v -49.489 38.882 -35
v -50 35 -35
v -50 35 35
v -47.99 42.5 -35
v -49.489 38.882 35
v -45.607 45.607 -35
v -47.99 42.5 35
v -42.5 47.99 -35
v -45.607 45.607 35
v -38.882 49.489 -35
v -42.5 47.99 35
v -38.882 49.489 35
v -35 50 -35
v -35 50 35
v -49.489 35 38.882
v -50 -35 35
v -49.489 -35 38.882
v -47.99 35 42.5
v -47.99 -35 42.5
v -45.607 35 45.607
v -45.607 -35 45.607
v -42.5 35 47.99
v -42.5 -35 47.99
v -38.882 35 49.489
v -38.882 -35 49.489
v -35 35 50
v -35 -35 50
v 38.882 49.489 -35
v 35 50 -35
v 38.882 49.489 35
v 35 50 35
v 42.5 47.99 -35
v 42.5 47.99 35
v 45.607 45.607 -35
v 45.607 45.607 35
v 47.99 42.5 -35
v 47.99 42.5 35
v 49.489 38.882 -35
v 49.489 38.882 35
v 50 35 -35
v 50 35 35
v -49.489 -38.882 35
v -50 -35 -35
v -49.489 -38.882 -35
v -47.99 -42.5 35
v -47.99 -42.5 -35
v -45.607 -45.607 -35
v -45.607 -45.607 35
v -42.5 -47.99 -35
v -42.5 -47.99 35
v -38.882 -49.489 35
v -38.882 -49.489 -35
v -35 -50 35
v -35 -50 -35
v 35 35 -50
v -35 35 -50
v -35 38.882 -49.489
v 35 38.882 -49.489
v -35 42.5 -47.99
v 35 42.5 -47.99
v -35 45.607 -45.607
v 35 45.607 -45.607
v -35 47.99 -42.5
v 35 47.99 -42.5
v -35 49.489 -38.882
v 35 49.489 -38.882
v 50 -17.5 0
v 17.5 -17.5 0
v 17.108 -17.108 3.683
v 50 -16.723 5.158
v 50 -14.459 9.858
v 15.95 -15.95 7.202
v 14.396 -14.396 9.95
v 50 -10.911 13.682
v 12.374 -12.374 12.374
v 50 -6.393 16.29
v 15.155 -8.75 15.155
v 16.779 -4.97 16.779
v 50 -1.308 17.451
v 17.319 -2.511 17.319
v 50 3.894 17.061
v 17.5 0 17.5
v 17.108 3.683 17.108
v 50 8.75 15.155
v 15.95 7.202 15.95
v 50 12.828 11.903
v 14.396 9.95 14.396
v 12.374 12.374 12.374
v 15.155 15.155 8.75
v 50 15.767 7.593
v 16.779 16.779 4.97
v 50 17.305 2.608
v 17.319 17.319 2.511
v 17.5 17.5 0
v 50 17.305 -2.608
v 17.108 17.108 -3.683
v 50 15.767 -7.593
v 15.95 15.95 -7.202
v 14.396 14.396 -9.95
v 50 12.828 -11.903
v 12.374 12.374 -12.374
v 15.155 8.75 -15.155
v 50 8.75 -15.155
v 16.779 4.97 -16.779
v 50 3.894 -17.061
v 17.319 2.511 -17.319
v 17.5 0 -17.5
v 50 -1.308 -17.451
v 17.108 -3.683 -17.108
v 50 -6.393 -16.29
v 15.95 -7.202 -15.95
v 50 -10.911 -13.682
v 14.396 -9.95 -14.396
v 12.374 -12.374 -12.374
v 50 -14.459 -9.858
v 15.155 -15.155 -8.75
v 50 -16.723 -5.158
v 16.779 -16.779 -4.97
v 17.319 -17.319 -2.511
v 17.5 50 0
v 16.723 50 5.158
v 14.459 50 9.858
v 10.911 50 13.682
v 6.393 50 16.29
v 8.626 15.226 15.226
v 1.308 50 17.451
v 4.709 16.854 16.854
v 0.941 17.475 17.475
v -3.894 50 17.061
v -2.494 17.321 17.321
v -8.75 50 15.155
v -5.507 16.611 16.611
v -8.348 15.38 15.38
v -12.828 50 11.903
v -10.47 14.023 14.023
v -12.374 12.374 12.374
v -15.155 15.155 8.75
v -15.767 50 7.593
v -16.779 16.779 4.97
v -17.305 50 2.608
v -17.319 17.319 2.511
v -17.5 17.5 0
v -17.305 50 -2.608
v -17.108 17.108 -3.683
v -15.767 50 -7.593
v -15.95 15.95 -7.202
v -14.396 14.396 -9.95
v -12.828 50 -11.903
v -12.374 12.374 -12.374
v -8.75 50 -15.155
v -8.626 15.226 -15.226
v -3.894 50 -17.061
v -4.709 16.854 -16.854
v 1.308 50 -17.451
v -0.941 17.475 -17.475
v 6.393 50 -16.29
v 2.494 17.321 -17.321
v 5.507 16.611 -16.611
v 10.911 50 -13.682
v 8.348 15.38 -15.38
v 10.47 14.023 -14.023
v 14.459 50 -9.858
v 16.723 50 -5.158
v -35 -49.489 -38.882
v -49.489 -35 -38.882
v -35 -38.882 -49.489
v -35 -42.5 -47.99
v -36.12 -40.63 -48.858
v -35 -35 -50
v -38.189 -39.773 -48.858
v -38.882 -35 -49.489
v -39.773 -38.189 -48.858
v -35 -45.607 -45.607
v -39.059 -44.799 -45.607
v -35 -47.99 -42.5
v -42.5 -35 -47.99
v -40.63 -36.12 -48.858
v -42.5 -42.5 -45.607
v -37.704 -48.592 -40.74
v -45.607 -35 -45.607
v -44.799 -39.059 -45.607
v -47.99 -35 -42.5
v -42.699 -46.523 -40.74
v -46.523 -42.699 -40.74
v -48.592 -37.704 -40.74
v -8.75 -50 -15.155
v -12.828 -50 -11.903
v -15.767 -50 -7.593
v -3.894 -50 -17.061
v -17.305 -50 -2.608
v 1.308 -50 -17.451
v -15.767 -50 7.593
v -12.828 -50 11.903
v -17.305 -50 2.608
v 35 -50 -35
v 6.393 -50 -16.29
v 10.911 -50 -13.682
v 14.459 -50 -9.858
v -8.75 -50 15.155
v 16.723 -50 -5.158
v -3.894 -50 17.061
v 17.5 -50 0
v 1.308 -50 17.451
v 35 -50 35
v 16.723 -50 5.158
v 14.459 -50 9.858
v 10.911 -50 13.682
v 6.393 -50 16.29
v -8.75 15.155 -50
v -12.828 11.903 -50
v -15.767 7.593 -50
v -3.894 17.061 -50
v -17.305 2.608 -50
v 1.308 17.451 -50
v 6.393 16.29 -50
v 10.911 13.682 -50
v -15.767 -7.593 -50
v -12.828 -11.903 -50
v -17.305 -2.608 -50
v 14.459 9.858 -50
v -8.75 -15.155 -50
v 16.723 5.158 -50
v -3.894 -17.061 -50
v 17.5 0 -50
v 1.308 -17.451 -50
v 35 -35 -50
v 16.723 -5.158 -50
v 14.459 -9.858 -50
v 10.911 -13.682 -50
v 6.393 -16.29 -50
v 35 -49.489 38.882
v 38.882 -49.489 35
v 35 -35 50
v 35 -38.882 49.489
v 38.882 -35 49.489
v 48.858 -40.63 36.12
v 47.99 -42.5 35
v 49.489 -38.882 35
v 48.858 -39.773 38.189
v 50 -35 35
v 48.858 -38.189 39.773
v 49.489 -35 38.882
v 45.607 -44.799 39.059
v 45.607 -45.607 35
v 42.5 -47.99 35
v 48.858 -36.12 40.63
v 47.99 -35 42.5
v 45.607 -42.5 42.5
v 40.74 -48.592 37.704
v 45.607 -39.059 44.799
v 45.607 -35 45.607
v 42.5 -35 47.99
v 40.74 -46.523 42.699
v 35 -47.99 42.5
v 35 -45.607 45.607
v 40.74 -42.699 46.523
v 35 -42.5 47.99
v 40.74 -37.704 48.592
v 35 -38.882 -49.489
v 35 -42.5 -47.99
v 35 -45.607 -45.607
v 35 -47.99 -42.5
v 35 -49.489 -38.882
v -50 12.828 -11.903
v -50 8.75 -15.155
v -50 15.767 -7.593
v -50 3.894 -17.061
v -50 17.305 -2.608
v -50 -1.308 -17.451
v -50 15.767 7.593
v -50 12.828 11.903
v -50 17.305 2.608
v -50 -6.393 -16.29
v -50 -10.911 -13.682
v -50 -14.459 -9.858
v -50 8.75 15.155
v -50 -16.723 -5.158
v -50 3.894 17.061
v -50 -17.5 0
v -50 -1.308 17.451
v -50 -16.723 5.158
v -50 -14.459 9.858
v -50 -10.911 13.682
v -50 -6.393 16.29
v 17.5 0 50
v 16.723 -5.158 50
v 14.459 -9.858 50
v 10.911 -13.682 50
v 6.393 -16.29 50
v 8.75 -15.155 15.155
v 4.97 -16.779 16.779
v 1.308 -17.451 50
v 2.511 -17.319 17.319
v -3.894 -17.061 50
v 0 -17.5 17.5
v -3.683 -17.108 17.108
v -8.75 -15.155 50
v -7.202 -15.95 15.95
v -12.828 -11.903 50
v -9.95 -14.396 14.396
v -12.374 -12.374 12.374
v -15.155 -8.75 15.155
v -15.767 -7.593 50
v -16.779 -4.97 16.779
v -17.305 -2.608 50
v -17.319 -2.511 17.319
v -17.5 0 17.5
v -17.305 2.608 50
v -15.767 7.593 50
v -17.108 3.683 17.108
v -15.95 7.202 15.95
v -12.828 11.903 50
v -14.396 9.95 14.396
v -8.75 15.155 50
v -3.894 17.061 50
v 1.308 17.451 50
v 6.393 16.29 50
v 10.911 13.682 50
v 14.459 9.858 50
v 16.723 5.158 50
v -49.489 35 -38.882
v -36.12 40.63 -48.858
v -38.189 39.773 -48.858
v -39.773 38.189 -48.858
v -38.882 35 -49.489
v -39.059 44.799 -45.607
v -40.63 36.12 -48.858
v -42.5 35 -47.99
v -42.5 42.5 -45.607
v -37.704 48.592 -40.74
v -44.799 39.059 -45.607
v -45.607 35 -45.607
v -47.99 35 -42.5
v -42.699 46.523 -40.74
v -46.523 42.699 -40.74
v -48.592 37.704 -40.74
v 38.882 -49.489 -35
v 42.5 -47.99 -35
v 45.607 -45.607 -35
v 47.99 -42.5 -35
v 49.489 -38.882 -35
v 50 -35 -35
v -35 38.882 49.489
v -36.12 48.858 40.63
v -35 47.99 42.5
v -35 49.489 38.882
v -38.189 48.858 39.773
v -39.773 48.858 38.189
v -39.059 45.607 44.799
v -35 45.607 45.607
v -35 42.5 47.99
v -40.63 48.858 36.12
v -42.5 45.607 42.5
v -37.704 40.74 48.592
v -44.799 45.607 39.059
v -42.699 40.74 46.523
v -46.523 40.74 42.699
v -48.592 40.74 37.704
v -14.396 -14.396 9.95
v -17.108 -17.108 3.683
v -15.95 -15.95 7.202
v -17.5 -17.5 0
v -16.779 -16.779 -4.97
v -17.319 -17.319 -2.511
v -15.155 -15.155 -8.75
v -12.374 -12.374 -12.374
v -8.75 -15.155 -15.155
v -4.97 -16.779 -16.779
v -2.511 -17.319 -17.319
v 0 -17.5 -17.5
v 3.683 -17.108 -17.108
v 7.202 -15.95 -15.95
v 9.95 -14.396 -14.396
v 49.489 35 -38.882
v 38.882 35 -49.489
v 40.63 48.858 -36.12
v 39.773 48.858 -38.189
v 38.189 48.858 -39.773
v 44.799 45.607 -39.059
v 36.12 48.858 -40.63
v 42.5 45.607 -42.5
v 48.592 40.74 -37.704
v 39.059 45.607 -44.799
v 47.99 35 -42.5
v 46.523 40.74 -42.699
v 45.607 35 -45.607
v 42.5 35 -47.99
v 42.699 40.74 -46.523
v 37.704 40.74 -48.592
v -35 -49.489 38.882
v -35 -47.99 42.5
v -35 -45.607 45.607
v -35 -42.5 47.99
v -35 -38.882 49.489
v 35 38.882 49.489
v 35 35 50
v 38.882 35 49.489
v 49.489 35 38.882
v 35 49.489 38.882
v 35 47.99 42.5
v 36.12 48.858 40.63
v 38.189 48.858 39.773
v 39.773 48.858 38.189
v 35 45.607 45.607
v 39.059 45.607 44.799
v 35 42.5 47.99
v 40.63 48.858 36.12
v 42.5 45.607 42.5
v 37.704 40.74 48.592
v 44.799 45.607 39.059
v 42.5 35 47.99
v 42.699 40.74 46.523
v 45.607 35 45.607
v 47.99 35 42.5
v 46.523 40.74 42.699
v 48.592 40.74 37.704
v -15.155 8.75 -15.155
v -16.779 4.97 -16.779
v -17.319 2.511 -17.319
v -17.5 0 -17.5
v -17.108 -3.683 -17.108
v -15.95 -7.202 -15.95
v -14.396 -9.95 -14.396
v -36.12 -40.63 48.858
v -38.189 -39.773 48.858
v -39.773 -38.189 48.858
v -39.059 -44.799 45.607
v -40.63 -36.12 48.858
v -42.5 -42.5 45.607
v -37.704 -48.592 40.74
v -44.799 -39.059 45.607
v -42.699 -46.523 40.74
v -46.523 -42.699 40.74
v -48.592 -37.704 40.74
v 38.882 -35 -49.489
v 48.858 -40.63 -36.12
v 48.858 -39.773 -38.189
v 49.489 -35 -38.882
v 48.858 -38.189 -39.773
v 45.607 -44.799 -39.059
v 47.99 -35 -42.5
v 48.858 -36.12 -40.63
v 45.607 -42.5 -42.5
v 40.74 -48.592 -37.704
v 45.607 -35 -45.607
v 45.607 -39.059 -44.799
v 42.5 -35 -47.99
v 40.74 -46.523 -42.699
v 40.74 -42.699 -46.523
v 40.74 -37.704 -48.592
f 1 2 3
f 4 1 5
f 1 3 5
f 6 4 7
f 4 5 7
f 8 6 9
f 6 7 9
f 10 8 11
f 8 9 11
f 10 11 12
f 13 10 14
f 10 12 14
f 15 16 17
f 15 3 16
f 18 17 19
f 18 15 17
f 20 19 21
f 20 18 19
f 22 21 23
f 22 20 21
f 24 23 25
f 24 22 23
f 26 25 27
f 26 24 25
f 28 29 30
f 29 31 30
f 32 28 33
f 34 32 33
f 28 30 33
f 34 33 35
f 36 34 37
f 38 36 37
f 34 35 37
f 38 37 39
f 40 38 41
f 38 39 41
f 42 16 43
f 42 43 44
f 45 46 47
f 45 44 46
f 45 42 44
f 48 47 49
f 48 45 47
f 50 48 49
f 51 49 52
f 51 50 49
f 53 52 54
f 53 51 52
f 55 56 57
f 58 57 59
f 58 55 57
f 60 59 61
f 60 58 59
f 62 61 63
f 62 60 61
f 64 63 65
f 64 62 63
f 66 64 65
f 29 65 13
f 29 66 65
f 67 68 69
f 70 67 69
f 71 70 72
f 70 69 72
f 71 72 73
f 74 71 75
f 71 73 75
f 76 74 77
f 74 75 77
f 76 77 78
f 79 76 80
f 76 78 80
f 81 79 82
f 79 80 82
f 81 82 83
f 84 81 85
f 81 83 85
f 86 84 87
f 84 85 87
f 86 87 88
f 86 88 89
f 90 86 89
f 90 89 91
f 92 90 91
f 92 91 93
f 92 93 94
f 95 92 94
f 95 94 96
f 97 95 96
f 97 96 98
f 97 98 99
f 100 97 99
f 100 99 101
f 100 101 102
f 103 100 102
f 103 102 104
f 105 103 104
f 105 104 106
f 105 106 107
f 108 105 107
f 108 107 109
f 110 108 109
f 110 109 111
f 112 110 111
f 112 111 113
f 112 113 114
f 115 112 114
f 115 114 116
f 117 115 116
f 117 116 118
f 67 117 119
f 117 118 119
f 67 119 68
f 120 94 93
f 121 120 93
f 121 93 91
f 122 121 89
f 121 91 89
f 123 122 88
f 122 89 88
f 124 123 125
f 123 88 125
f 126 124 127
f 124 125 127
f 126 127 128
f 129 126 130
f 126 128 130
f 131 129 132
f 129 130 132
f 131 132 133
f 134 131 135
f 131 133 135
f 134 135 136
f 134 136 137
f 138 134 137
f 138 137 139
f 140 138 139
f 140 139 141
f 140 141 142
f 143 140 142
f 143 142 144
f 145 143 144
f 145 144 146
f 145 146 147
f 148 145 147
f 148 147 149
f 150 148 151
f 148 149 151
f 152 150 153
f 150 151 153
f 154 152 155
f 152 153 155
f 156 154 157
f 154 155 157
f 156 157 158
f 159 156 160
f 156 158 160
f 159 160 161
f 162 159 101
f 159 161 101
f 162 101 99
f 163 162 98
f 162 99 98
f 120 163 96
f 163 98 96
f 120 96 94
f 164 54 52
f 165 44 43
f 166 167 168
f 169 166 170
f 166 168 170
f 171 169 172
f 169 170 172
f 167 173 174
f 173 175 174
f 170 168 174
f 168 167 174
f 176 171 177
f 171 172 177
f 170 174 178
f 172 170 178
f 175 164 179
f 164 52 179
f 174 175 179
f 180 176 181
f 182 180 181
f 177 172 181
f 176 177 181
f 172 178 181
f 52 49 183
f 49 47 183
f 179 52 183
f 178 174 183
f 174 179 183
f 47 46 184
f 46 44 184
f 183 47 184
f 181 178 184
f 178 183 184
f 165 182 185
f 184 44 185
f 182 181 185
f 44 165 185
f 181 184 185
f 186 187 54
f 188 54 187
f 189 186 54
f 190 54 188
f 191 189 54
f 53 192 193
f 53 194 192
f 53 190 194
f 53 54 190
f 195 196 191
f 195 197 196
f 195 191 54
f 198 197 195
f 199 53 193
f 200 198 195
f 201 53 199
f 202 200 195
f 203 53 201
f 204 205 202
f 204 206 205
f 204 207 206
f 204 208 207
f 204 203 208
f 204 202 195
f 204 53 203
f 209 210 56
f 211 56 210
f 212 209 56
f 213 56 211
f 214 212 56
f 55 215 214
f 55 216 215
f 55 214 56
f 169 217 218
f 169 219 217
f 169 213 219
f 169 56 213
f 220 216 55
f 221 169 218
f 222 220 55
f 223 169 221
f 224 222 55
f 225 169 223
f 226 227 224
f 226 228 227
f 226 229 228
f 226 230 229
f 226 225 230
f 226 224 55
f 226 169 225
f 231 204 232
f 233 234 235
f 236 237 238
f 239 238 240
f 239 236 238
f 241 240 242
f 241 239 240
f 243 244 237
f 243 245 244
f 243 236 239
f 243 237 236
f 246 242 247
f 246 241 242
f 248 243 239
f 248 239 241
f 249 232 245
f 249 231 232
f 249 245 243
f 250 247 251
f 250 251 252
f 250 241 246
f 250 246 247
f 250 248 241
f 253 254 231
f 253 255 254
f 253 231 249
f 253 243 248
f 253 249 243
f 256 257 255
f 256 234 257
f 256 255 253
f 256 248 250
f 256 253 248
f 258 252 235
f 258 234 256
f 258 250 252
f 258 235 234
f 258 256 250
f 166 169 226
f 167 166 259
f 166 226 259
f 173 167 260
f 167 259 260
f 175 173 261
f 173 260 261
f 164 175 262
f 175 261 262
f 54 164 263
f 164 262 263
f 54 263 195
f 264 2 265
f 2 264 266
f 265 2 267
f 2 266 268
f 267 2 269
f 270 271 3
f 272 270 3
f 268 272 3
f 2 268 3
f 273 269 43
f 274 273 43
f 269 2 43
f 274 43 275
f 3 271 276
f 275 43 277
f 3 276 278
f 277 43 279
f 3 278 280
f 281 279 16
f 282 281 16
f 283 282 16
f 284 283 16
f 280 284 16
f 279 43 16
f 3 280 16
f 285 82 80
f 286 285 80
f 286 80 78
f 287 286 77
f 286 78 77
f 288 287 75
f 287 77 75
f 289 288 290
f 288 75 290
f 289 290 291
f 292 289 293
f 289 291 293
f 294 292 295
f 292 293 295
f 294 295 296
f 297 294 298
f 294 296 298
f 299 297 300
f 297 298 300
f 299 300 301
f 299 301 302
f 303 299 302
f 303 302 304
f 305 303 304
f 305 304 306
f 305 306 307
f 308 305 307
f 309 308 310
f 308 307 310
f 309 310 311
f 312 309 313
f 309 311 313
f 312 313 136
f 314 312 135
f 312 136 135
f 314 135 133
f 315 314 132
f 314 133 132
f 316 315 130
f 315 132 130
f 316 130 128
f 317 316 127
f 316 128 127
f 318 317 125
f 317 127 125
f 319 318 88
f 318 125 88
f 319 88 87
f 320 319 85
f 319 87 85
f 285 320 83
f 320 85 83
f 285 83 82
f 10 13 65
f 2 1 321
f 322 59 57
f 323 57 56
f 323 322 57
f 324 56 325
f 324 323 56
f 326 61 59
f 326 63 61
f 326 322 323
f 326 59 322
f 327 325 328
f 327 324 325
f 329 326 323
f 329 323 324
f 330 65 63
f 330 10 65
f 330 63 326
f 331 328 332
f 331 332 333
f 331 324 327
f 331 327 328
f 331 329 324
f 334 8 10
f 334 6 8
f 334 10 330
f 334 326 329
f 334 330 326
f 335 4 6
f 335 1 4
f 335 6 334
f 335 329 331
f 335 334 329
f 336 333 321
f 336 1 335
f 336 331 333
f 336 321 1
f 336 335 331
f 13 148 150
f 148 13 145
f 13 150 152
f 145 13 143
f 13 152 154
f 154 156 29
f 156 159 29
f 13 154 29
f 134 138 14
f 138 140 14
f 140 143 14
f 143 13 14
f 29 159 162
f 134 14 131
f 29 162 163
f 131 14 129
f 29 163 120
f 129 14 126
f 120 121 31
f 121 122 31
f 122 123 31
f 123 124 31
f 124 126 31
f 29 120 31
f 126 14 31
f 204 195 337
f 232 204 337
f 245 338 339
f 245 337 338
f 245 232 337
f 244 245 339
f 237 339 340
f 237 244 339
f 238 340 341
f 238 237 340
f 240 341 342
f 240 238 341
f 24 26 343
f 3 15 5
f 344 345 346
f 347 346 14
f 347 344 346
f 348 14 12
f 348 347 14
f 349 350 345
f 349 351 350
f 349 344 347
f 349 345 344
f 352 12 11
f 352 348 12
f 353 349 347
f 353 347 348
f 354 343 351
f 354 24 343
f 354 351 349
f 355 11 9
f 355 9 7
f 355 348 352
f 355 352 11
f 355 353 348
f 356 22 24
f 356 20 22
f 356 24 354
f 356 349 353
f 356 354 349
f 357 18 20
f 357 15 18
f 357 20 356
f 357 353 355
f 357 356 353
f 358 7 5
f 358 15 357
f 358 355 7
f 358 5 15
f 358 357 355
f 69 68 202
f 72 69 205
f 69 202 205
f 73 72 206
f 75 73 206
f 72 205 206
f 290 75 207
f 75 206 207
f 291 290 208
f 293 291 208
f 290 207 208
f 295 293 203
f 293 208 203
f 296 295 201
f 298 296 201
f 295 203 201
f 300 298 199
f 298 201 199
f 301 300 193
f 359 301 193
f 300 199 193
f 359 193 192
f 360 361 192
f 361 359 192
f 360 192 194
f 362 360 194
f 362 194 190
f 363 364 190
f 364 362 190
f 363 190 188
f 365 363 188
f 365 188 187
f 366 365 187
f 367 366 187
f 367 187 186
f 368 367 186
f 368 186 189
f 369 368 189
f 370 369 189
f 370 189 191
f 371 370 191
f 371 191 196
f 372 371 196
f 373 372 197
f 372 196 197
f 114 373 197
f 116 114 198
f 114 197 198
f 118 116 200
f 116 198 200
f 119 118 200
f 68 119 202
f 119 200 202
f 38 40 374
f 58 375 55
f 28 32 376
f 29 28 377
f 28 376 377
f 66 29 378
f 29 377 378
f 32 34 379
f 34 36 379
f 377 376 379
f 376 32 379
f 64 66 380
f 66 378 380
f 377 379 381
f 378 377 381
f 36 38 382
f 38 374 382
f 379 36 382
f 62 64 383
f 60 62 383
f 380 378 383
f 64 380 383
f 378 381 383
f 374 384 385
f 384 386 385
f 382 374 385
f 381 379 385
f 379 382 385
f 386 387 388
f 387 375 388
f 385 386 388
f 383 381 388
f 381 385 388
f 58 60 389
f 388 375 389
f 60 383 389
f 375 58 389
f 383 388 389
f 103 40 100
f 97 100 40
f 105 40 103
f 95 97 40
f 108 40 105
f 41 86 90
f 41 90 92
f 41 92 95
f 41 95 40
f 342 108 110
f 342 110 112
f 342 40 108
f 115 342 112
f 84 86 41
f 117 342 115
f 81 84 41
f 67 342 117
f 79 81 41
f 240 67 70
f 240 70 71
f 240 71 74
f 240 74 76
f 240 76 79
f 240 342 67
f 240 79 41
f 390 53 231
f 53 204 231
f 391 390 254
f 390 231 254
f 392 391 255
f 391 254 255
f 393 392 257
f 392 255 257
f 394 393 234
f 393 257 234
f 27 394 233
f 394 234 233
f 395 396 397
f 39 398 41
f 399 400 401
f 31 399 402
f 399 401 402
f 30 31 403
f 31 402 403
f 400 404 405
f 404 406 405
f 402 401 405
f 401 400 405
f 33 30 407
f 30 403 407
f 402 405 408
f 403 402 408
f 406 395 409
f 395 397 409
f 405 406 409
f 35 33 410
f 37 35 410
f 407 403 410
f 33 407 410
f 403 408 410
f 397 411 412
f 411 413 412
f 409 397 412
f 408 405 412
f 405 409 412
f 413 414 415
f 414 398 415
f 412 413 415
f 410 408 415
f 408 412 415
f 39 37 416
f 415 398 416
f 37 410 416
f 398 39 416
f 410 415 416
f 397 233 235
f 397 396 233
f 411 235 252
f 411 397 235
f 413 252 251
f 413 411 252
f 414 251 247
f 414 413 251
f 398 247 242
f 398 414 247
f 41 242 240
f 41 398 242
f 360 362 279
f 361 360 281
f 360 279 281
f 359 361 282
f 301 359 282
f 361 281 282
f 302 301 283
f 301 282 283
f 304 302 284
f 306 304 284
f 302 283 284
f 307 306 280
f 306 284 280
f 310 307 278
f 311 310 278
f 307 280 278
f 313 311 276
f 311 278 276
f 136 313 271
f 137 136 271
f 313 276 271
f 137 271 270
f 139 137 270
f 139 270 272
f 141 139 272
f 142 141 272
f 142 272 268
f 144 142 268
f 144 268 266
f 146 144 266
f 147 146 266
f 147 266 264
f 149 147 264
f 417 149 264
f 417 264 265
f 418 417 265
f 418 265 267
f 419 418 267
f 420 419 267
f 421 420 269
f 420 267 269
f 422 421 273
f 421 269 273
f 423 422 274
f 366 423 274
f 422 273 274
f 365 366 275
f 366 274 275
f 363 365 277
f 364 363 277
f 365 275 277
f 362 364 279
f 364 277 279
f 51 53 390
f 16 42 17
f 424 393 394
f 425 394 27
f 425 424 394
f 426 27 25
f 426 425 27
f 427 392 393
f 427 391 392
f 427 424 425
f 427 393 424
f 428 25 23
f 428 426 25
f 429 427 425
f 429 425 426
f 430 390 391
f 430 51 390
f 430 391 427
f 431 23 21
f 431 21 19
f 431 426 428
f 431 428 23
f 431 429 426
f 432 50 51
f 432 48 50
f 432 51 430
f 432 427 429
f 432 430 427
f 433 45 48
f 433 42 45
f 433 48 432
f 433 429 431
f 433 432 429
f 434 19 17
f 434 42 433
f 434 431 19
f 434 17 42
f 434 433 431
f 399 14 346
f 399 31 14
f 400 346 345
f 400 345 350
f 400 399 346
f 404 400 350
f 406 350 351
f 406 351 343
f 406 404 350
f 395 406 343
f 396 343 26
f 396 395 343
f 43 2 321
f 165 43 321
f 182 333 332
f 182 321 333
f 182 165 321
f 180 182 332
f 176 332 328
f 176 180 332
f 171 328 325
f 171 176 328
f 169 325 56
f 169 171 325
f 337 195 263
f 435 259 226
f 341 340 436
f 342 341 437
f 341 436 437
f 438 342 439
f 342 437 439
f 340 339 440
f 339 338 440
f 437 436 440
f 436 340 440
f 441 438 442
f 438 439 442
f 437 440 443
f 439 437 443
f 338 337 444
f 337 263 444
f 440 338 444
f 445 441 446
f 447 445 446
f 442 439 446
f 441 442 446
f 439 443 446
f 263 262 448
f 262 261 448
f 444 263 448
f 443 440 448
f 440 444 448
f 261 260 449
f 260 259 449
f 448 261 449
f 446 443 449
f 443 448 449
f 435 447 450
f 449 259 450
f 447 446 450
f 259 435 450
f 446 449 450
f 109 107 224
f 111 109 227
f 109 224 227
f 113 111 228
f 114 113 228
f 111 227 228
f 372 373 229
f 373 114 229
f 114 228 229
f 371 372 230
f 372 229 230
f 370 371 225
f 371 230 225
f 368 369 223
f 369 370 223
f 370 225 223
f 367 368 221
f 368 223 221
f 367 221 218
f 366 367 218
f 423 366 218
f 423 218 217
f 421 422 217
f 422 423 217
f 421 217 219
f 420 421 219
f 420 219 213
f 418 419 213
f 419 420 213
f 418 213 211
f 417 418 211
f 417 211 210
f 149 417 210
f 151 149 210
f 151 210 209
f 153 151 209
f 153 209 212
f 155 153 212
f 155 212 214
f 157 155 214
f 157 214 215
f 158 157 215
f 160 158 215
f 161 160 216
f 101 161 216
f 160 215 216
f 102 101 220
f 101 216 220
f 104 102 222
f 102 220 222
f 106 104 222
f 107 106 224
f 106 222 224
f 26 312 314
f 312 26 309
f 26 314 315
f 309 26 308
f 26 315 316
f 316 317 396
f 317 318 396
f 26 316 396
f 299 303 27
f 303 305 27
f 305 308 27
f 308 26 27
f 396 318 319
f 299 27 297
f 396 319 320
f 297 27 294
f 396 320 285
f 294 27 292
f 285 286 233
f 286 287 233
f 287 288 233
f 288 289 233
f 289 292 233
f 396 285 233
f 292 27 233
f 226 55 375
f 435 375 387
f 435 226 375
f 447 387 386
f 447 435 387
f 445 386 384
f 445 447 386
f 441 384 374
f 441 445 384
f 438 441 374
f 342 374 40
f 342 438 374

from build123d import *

# Parameters (mm, degrees)
F0_W     = 100
F0_H     = 100
F1_DEPTH = 50
F2_R     = 17.5
F3_DEPTH = 100
F4_DEPTH = 100
F5_R     = 17.5
F6_DEPTH = 100
F7_R     = 17.5
F8_DEPTH = 100
F9_R     = 15


with BuildPart() as f1:
    # F0 (on Front) → F1 (new body, symmetric)
    with BuildSketch(Plane.XZ):
        Rectangle(F0_W, F0_H)
    extrude(amount=F1_DEPTH, both=True)

    # F2 (on face) → F3 (join, through all)
    with BuildSketch(Plane(origin=(-50, 0, 0), x_dir=(0, -1, 0), z_dir=(-1, 0, 0))):
        Circle(F2_R)
    extrude(amount=-F3_DEPTH)

    # F2 (on face) → F4 (cut, through all)
    with BuildSketch(Plane(origin=(-50, 0, 0), x_dir=(0, -1, 0), z_dir=(-1, 0, 0))):
        Circle(F2_R)
    extrude(amount=-F4_DEPTH, mode=Mode.SUBTRACT)

    # F5 (on face) → F6 (cut, through all)
    with BuildSketch(Plane.XZ.offset(50)):
        Circle(F5_R)
    extrude(amount=-F6_DEPTH, mode=Mode.SUBTRACT)

    # F7 (on face) → F8 (cut, through all)
    with BuildSketch(Plane(origin=(0, 0, -50), x_dir=(1, 0, 0), z_dir=(0, 0, -1))):
        Circle(F7_R)
    extrude(amount=-F8_DEPTH, mode=Mode.SUBTRACT)

    # F9
    f9_edges = [f1.edges().sort_by_distance(p)[0] for p in [
        (-50, -50, 0),
        (0, -50, 50),
        (0, -50, -50),
        (50, -50, 0),
        (50, 0, -50),
        (50, 0, 50),
        (-50, 0, 50),
        (0, 50, 50),
        (50, 50, 0),
        (-50, 50, 0),
        (0, 50, -50),
        (-50, 0, -50),
    ]]
    fillet(f9_edges, radius=F9_R)


solid = f1.part
